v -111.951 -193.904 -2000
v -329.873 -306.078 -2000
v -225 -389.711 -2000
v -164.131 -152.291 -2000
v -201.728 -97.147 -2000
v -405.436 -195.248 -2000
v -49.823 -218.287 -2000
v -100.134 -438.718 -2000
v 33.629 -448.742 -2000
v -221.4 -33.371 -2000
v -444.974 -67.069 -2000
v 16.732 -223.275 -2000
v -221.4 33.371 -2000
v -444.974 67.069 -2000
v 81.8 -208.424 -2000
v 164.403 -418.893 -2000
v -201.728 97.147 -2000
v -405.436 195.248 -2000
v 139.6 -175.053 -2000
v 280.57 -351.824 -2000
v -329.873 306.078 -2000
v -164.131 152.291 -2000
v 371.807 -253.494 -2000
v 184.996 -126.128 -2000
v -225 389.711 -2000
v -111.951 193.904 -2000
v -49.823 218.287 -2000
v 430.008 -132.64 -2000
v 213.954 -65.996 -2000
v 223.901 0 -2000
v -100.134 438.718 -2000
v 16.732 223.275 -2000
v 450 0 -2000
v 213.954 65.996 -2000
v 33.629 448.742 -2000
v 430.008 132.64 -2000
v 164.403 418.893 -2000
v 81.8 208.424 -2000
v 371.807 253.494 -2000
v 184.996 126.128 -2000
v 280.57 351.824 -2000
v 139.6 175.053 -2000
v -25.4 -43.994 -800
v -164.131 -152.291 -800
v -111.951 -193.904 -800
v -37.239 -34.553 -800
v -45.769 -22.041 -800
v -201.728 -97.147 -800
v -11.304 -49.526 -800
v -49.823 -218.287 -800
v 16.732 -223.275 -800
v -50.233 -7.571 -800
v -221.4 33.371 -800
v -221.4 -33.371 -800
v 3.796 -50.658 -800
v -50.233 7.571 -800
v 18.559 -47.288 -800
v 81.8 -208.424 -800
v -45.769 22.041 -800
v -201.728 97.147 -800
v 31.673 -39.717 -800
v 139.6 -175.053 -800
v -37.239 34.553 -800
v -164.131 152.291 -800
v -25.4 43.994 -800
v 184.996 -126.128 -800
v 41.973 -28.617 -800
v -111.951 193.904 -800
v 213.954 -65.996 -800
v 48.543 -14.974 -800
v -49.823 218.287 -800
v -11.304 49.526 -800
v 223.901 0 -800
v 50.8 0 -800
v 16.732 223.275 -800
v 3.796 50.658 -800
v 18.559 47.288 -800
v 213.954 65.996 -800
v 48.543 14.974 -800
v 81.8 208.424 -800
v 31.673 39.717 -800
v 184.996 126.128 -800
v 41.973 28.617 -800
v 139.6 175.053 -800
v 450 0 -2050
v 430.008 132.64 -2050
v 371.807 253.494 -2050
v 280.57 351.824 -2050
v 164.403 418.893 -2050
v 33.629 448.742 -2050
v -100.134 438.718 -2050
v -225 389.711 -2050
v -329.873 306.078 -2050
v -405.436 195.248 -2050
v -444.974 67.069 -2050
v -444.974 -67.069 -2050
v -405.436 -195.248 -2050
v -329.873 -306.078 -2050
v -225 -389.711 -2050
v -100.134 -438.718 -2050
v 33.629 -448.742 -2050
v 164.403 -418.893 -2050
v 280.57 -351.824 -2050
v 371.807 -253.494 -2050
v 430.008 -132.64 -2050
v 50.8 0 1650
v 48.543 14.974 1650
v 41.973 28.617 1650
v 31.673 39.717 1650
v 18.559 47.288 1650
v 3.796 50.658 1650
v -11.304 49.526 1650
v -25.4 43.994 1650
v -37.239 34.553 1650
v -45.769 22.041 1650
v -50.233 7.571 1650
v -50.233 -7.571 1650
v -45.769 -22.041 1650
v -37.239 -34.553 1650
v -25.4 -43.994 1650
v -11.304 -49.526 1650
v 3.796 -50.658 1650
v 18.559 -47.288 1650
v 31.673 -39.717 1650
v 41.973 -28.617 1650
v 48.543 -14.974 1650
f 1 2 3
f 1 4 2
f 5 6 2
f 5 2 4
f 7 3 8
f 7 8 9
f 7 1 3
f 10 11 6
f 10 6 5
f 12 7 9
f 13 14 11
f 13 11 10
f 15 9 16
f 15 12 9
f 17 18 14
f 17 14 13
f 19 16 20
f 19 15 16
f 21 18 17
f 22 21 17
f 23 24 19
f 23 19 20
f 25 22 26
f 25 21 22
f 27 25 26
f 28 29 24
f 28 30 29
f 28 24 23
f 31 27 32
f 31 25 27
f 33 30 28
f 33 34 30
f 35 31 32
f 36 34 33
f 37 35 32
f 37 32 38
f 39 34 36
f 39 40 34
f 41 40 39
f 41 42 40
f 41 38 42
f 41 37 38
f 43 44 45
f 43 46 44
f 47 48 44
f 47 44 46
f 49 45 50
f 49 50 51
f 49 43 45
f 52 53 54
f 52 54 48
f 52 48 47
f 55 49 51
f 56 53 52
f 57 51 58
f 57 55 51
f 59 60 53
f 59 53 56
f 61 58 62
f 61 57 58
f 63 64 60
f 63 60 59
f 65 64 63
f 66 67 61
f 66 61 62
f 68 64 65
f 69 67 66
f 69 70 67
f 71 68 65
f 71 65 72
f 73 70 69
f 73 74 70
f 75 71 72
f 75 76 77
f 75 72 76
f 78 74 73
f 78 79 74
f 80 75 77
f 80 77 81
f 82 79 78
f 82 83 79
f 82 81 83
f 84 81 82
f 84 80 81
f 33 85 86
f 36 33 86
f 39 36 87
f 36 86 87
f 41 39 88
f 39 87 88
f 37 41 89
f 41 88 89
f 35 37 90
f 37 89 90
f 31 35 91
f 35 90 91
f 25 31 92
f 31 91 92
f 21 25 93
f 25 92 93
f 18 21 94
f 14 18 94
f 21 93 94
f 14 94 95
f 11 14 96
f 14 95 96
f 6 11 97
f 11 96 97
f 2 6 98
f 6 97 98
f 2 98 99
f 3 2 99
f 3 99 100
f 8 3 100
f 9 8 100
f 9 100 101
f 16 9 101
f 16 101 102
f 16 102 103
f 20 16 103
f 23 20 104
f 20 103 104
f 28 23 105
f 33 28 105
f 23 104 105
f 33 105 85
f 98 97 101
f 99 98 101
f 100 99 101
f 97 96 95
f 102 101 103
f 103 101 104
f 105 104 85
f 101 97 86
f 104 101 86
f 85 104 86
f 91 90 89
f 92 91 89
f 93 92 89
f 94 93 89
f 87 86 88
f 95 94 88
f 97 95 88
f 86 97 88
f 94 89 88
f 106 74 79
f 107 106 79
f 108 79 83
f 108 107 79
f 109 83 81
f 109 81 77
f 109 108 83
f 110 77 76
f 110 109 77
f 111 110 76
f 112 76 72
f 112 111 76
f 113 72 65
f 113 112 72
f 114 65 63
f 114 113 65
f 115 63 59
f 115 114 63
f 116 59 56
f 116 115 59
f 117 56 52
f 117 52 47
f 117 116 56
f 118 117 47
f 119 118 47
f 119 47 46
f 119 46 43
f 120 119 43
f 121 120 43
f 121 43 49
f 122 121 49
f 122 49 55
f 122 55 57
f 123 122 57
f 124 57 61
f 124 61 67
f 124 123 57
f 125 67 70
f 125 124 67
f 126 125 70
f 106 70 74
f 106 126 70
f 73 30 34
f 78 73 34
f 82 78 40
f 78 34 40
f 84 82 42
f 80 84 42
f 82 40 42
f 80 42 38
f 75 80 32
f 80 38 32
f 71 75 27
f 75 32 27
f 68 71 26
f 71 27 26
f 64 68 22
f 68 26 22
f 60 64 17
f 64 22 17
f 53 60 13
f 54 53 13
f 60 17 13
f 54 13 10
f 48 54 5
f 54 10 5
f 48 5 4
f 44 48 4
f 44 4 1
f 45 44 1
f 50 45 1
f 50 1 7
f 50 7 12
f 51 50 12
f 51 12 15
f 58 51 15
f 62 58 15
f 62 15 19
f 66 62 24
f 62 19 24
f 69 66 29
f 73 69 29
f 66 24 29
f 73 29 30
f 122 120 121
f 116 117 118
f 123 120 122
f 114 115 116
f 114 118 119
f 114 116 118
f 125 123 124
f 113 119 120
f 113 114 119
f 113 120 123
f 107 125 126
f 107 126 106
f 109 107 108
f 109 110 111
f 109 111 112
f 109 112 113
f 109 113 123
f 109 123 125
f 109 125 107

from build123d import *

# Parameters (mm, degrees)
SKETCH1_R                = 50.8
BOSS_EXTRUDE1_DEPTH      = 1650
BOSS_EXTRUDE1_DEPTH_BACK = 2050
SKETCH2_R                = 450
BOSS_EXTRUDE2_DEPTH      = 50
SKETCH3_R                = 223.901
BOSS_EXTRUDE3_DEPTH      = 1200


with BuildPart() as part:
    # Sketch1 → Boss-Extrude1 (new body, two sides)
    with BuildSketch(Plane.XY) as boss_extrude1_sk:
        Circle(SKETCH1_R)
    extrude(amount=BOSS_EXTRUDE1_DEPTH)
    extrude(boss_extrude1_sk.sketch, amount=-BOSS_EXTRUDE1_DEPTH_BACK)

    # Sketch2 → Boss-Extrude2 (add)
    with BuildSketch(Plane.XY.offset(-2050)):
        Circle(SKETCH2_R)
    extrude(amount=BOSS_EXTRUDE2_DEPTH)

    # Sketch3 → Boss-Extrude3 (add)
    with BuildSketch(Plane.XY.offset(-2000)):
        Circle(SKETCH3_R)
    extrude(amount=BOSS_EXTRUDE3_DEPTH)


solid = part.part
